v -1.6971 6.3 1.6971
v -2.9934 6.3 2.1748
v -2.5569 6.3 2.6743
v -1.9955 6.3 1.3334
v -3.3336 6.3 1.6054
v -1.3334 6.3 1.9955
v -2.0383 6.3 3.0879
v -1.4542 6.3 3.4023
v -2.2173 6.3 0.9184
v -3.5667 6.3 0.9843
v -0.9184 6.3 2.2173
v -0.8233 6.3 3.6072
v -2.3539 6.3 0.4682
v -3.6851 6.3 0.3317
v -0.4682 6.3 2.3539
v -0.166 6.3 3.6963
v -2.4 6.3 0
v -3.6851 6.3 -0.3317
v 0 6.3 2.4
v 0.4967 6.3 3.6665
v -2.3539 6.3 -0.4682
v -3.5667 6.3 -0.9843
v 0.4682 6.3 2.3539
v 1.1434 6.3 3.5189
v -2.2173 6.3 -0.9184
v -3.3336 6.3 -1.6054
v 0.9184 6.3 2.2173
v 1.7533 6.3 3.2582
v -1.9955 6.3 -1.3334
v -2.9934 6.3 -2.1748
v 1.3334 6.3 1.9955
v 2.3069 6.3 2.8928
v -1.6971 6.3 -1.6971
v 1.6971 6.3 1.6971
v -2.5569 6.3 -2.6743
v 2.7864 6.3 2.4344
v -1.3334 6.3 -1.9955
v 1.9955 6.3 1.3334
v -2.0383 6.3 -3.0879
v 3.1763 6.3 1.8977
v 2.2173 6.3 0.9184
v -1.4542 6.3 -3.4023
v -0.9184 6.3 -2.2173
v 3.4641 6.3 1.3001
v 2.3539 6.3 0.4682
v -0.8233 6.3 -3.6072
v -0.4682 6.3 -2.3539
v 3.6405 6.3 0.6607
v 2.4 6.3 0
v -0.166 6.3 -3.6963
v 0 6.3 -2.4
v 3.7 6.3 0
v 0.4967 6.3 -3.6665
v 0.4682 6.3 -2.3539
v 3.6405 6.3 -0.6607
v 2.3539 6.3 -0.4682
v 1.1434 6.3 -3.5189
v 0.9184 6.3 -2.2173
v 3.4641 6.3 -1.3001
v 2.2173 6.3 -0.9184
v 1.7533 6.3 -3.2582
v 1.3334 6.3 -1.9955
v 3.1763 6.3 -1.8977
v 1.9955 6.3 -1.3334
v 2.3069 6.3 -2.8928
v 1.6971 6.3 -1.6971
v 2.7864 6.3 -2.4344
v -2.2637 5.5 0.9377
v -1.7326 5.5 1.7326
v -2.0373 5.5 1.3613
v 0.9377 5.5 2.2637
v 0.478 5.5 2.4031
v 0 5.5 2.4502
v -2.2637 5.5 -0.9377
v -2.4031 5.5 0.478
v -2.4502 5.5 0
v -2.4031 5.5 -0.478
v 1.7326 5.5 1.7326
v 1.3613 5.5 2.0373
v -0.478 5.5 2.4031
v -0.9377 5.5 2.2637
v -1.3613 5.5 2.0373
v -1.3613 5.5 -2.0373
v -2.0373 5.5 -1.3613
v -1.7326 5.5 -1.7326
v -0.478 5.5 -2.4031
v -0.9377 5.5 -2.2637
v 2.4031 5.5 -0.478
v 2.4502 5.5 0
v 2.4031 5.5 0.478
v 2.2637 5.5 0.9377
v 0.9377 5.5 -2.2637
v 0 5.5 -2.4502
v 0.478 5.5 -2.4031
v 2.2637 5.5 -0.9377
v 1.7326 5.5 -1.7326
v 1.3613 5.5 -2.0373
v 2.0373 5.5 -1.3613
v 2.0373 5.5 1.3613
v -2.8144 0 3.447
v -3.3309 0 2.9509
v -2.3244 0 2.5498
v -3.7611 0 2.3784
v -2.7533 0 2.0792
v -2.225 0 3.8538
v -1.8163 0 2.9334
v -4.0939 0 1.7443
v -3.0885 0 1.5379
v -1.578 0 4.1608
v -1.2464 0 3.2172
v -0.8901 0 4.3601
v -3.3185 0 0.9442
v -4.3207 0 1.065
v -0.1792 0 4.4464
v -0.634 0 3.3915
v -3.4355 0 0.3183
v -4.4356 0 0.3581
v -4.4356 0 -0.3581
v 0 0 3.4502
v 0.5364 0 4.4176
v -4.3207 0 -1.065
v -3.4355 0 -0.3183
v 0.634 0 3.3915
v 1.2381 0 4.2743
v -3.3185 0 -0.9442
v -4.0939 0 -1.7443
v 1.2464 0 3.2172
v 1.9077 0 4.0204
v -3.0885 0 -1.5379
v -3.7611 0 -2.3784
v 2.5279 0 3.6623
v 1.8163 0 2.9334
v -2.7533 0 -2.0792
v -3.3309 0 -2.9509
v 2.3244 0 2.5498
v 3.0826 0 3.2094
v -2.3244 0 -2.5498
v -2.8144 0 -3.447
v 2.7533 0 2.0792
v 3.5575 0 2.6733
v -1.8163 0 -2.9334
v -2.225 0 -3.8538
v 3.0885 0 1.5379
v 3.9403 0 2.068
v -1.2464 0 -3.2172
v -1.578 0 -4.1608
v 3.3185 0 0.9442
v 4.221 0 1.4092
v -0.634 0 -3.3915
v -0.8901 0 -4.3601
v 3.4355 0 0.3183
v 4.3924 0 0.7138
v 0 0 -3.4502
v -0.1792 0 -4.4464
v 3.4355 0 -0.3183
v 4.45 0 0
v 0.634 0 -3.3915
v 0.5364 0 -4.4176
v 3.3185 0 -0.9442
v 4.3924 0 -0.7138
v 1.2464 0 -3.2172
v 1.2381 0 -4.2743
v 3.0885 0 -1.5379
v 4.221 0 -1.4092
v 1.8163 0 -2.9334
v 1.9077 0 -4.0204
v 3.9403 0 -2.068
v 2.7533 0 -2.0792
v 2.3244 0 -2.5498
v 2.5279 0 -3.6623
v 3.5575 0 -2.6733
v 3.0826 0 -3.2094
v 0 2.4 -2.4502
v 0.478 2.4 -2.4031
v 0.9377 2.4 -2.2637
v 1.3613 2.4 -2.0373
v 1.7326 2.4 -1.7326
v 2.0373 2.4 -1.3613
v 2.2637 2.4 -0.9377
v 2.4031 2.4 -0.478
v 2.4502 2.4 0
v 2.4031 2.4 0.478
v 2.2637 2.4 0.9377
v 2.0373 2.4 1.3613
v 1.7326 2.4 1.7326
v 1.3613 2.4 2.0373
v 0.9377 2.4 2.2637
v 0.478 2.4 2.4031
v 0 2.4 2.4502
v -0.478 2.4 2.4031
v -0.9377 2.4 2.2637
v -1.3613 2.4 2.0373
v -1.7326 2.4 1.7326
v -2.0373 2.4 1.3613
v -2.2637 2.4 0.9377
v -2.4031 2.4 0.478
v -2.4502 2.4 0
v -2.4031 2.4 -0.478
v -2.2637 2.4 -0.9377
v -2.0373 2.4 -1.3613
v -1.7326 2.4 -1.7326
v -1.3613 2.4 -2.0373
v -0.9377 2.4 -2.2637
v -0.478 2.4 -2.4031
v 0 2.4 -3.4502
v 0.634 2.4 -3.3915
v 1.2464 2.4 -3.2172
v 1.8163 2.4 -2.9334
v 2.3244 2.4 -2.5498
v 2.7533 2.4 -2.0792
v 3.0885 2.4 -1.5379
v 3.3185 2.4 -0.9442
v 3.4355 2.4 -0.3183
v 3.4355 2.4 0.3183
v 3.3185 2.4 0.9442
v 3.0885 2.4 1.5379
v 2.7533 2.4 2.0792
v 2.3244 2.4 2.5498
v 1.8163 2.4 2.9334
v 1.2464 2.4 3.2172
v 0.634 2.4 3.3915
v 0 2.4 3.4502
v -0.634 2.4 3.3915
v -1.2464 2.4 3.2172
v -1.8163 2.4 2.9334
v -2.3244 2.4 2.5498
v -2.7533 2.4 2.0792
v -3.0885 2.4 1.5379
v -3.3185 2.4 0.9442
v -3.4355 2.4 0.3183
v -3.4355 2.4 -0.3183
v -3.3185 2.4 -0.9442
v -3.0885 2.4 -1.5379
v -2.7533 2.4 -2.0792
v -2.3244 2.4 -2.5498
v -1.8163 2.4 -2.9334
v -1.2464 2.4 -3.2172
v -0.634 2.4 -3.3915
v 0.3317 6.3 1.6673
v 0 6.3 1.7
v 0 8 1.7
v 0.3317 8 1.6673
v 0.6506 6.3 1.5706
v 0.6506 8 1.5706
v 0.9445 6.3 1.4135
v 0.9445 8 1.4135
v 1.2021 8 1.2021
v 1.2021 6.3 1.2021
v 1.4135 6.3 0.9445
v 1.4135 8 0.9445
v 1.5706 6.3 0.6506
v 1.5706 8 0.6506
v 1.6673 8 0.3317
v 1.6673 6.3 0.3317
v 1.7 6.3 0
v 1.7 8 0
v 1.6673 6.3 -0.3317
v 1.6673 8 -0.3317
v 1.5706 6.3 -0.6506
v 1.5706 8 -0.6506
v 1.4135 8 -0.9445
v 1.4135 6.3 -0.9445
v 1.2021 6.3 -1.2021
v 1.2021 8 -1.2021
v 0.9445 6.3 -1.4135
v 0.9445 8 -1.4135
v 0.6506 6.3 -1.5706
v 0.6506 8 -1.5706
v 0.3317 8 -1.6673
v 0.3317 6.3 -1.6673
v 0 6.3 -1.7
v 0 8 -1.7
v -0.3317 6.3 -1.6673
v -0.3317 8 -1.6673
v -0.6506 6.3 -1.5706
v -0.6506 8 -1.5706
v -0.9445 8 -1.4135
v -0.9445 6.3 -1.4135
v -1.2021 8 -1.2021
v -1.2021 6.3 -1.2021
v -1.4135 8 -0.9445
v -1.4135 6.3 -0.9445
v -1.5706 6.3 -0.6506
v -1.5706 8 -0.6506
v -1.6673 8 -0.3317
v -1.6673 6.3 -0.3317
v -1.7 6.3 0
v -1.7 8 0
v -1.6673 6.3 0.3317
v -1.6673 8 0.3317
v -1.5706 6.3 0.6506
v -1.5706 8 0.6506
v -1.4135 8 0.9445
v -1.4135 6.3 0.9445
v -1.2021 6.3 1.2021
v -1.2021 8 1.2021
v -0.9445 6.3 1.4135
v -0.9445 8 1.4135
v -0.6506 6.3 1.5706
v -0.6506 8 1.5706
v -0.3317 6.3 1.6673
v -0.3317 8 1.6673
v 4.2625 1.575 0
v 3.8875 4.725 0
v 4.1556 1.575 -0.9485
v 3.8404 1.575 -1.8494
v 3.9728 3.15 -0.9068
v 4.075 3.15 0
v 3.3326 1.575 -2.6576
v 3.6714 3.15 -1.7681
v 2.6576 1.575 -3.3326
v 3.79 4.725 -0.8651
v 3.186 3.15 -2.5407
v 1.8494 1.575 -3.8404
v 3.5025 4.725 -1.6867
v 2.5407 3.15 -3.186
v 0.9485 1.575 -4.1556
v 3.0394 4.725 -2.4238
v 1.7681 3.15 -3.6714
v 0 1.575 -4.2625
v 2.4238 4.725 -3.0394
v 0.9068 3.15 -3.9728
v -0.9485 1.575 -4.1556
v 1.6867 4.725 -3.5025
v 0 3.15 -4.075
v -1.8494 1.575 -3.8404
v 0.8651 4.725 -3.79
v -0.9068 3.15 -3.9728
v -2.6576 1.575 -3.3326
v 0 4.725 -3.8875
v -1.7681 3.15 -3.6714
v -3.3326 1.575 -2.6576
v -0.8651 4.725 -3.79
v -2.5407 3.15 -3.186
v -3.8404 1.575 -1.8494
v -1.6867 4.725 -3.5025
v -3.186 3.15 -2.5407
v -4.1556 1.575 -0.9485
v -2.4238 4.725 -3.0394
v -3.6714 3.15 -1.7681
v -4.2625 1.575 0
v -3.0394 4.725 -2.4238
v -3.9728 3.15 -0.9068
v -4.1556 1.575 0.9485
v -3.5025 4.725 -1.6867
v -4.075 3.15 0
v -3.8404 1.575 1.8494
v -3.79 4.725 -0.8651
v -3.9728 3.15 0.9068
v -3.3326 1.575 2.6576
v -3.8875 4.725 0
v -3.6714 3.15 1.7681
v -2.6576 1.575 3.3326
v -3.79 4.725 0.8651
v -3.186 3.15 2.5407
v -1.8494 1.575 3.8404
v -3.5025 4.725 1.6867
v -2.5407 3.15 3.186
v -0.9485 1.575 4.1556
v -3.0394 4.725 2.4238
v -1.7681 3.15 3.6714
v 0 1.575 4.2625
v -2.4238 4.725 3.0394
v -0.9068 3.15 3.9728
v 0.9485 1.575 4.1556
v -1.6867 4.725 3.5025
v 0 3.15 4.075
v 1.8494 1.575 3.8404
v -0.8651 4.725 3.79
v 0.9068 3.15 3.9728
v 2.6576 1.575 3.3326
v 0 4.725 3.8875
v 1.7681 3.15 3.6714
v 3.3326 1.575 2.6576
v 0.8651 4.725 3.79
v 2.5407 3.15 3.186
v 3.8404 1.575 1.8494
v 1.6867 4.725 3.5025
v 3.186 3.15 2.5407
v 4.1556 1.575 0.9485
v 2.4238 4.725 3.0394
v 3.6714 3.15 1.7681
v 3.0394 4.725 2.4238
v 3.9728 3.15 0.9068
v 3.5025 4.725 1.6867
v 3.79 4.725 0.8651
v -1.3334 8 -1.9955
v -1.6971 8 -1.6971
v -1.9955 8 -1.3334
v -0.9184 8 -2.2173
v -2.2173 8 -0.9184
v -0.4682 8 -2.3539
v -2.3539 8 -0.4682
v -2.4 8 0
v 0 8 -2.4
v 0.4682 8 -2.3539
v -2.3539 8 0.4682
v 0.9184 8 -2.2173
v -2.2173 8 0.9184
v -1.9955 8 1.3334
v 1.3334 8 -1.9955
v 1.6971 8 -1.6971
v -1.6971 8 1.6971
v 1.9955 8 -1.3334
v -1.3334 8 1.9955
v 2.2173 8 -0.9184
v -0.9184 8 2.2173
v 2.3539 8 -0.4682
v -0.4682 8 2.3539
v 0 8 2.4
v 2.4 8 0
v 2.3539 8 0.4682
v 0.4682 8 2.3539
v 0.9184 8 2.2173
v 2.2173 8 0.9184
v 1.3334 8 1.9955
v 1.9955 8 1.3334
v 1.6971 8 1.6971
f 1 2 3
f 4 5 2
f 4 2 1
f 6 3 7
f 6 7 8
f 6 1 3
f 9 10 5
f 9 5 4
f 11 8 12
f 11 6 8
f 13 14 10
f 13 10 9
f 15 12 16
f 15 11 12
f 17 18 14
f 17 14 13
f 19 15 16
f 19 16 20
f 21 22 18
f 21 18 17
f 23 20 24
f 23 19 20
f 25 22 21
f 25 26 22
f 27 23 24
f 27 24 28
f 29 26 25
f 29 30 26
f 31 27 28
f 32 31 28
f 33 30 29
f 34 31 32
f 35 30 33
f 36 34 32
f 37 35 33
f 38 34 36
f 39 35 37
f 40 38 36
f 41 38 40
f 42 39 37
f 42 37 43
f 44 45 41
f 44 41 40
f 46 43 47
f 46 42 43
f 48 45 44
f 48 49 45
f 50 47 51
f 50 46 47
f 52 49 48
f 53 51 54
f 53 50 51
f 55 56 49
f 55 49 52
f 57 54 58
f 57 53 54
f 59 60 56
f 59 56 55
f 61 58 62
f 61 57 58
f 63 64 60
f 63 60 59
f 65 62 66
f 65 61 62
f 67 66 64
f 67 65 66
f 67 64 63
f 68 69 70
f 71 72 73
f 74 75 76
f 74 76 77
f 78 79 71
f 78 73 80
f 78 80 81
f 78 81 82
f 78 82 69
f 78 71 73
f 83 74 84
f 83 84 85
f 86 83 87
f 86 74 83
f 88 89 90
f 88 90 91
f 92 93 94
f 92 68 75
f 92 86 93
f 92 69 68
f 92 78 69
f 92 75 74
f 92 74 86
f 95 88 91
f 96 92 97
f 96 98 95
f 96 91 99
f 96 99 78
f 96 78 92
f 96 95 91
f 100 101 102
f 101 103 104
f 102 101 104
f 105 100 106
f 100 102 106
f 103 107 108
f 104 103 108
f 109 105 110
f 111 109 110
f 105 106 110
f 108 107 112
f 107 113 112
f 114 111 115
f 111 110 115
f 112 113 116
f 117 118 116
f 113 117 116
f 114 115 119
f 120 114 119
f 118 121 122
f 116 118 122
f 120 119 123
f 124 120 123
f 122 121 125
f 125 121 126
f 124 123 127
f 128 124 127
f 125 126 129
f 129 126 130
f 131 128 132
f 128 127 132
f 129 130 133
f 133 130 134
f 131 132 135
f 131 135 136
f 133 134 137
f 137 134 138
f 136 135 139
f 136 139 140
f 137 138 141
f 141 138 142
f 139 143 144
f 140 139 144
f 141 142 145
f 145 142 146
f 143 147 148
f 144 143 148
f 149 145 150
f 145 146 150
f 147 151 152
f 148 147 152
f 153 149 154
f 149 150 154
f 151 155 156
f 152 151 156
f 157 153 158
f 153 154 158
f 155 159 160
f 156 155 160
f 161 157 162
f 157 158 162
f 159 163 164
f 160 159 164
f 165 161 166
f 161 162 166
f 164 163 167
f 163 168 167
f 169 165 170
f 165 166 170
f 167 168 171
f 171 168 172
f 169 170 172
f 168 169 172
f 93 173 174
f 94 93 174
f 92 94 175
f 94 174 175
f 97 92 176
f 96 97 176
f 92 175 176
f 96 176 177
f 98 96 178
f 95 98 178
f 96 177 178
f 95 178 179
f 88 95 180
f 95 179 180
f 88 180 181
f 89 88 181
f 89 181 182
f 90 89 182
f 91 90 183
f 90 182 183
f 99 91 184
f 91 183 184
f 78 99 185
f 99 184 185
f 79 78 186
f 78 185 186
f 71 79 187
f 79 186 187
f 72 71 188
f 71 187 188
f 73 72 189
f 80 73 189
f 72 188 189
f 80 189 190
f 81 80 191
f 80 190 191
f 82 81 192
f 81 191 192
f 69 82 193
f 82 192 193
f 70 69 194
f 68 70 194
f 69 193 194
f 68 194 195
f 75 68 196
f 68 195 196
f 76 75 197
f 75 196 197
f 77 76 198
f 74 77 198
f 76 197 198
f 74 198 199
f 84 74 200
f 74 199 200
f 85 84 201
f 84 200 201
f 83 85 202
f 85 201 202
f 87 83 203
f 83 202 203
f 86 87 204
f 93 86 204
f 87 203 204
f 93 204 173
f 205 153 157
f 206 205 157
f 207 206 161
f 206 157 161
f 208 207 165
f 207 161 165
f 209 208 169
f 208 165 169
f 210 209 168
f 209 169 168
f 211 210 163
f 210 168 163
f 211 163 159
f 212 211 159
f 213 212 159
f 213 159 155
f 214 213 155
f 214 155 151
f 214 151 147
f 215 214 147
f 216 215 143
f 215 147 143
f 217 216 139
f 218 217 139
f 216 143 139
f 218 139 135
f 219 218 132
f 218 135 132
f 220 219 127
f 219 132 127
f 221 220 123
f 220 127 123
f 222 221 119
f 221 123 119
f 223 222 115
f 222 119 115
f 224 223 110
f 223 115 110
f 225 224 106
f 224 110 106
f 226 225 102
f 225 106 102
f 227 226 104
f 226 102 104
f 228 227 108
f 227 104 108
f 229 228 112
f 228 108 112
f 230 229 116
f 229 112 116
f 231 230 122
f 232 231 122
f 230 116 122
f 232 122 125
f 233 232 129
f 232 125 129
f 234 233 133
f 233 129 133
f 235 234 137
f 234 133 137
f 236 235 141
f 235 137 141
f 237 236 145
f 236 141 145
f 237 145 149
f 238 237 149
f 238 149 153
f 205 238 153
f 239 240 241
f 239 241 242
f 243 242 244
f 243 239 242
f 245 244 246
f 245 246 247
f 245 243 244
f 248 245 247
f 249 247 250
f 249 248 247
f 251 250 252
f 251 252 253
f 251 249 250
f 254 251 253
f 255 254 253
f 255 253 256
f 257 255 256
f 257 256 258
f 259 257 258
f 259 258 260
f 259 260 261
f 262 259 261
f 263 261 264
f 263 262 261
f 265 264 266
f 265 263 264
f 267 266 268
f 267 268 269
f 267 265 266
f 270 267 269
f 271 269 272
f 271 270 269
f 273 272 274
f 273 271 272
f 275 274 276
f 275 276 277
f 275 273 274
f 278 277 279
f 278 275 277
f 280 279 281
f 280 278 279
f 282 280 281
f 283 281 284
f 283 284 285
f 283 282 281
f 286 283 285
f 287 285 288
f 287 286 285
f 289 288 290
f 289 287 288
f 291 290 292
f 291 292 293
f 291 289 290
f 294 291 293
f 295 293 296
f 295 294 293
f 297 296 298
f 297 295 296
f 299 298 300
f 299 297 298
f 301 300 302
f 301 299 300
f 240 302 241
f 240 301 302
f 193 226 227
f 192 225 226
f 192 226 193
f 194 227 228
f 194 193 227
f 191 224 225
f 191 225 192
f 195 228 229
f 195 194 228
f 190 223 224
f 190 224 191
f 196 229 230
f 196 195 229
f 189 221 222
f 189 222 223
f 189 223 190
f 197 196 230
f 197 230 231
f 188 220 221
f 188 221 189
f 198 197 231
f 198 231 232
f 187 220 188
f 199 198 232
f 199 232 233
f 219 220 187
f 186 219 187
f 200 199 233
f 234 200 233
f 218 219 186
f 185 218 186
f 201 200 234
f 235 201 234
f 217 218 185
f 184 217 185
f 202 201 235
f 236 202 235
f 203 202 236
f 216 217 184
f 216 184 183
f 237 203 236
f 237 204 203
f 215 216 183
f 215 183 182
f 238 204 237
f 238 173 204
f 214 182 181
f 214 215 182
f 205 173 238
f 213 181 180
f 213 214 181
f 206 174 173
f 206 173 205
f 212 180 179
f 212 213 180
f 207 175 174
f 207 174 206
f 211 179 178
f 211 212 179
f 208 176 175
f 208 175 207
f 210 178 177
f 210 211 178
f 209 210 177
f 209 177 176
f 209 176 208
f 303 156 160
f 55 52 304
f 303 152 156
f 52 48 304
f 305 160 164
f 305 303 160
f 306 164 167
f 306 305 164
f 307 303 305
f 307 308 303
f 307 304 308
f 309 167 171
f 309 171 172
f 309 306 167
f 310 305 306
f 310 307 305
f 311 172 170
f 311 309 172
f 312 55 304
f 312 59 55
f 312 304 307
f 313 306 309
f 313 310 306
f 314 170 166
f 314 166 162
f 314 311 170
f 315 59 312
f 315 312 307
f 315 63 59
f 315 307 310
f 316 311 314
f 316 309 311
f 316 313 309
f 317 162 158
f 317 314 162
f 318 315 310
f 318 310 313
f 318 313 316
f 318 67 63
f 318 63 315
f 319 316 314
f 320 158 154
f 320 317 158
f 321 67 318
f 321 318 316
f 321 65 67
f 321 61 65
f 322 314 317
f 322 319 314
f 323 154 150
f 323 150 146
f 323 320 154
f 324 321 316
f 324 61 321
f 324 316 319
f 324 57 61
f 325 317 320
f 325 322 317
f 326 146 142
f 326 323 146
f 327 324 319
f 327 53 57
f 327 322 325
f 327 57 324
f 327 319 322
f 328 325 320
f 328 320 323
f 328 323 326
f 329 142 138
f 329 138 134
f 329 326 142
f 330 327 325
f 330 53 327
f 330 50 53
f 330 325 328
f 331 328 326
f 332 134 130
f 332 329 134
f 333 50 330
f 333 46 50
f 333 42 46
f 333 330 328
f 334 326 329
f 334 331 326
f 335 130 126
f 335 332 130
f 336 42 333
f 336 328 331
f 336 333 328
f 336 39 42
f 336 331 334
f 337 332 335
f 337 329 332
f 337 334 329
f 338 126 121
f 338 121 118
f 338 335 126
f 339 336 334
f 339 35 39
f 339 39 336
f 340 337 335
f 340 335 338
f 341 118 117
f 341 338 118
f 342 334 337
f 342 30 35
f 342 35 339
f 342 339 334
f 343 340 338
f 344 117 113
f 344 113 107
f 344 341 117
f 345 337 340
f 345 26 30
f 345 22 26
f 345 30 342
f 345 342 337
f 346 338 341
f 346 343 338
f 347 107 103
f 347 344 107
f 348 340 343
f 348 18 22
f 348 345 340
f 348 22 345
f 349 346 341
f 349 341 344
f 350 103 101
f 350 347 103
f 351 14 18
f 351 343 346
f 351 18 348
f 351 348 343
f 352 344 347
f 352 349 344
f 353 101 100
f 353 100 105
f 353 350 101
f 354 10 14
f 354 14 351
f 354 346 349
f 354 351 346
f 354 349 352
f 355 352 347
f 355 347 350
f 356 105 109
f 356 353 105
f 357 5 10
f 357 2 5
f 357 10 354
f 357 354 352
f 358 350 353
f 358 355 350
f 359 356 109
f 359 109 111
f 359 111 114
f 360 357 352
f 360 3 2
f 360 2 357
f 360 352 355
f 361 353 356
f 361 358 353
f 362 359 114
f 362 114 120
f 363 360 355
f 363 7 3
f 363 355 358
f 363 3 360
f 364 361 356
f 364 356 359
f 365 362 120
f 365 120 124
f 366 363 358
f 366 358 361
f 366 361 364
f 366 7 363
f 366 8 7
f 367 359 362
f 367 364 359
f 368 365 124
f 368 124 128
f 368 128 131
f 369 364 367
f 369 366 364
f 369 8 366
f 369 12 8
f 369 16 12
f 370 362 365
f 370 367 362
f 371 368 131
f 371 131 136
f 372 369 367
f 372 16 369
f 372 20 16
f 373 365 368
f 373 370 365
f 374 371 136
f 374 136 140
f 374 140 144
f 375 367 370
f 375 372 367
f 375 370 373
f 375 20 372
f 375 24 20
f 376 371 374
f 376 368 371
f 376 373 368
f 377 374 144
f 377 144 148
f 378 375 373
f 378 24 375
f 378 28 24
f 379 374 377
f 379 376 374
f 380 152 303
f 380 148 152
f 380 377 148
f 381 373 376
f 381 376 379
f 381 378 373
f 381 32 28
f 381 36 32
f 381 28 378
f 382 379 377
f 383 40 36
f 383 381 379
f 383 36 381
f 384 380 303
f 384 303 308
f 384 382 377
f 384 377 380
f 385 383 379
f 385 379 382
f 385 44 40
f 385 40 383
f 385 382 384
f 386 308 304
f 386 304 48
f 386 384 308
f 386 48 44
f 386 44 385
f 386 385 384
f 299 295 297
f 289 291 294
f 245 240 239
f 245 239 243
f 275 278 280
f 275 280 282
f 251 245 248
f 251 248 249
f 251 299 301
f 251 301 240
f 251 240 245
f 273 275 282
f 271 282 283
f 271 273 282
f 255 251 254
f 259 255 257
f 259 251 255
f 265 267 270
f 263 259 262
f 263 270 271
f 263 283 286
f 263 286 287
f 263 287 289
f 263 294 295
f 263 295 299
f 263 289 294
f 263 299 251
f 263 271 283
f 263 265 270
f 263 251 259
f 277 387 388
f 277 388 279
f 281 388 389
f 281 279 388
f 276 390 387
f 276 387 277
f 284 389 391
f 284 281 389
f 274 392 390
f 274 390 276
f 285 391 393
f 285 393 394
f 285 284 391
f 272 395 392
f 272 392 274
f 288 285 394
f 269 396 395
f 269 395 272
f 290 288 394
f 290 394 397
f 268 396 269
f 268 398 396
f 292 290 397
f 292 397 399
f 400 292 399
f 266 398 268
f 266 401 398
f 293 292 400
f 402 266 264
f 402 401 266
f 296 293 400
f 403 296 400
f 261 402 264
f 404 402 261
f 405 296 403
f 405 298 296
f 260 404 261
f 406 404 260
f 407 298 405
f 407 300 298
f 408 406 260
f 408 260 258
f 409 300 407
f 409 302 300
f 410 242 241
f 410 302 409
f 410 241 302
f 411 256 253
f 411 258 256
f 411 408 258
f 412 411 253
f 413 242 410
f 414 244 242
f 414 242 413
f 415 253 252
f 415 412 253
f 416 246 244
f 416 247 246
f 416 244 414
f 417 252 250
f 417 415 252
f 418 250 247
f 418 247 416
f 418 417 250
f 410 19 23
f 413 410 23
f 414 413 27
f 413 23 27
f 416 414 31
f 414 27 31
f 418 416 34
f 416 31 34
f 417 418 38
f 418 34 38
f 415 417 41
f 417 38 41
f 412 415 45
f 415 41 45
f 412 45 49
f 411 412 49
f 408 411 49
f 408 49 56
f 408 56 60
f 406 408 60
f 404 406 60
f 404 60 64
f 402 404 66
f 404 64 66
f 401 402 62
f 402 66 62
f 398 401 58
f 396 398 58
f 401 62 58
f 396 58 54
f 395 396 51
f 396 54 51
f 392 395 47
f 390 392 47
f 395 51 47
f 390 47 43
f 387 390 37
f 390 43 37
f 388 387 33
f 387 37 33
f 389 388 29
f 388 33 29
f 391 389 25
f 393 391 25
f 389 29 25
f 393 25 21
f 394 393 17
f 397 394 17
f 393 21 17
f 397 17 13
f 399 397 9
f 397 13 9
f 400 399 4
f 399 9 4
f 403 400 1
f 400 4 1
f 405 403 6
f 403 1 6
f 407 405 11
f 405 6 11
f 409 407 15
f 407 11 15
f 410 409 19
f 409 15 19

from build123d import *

# Parameters (mm, degrees)
SKETCH1_R           = 4.45
SKETCH2_R           = 3.7
SKETCH3_R           = 2.4
SKETCH3_R_2         = 1.7
BOSS_EXTRUDE1_DEPTH = 1.7
SKETCH4_R           = 3.450229513
CUT_EXTRUDE1_DEPTH  = 2.4
SKETCH5_R           = 2.450229513
CUT_EXTRUDE2_DEPTH  = 3.1


with BuildPart() as part:
    # Sketch1 → Loft1 section 0
    with BuildSketch(Plane(origin=(0, 0, 0), x_dir=(1, 0, 0), z_dir=(0, 1, 0))):
        Circle(SKETCH1_R)
    # Sketch2 → Loft1 section 1
    with BuildSketch(Plane(origin=(0, 6.3, 0), x_dir=(1, 0, 0), z_dir=(0, 1, 0))):
        Circle(SKETCH2_R)
    loft()

    # Sketch3 → Boss-Extrude1 (add)
    with BuildSketch(Plane(origin=(0, 6.3, 0), x_dir=(1, 0, 0), z_dir=(0, 1, 0))):
        with Locations(Location((0, 0, 0), (0, 0, 270))):
            Circle(SKETCH3_R)
        with Locations(Location((0, 0, 0), (0, 0, 270))):
            Circle(SKETCH3_R_2, mode=Mode.SUBTRACT)
    extrude(amount=BOSS_EXTRUDE1_DEPTH)

    # Sketch4 → Cut-Extrude1 (cut)
    with BuildSketch(Plane.XZ):
        with Locations(Location((0, 0, 0), (0, 0, 270))):
            Circle(SKETCH4_R)
    extrude(amount=-CUT_EXTRUDE1_DEPTH, mode=Mode.SUBTRACT)

    # Sketch5 → Cut-Extrude2 (cut)
    with BuildSketch(Plane.XZ.offset(-2.4)):
        with Locations(Location((0, 0, 0), (0, 0, 270))):
            Circle(SKETCH5_R)
    extrude(amount=-CUT_EXTRUDE2_DEPTH, mode=Mode.SUBTRACT)


solid = part.part
